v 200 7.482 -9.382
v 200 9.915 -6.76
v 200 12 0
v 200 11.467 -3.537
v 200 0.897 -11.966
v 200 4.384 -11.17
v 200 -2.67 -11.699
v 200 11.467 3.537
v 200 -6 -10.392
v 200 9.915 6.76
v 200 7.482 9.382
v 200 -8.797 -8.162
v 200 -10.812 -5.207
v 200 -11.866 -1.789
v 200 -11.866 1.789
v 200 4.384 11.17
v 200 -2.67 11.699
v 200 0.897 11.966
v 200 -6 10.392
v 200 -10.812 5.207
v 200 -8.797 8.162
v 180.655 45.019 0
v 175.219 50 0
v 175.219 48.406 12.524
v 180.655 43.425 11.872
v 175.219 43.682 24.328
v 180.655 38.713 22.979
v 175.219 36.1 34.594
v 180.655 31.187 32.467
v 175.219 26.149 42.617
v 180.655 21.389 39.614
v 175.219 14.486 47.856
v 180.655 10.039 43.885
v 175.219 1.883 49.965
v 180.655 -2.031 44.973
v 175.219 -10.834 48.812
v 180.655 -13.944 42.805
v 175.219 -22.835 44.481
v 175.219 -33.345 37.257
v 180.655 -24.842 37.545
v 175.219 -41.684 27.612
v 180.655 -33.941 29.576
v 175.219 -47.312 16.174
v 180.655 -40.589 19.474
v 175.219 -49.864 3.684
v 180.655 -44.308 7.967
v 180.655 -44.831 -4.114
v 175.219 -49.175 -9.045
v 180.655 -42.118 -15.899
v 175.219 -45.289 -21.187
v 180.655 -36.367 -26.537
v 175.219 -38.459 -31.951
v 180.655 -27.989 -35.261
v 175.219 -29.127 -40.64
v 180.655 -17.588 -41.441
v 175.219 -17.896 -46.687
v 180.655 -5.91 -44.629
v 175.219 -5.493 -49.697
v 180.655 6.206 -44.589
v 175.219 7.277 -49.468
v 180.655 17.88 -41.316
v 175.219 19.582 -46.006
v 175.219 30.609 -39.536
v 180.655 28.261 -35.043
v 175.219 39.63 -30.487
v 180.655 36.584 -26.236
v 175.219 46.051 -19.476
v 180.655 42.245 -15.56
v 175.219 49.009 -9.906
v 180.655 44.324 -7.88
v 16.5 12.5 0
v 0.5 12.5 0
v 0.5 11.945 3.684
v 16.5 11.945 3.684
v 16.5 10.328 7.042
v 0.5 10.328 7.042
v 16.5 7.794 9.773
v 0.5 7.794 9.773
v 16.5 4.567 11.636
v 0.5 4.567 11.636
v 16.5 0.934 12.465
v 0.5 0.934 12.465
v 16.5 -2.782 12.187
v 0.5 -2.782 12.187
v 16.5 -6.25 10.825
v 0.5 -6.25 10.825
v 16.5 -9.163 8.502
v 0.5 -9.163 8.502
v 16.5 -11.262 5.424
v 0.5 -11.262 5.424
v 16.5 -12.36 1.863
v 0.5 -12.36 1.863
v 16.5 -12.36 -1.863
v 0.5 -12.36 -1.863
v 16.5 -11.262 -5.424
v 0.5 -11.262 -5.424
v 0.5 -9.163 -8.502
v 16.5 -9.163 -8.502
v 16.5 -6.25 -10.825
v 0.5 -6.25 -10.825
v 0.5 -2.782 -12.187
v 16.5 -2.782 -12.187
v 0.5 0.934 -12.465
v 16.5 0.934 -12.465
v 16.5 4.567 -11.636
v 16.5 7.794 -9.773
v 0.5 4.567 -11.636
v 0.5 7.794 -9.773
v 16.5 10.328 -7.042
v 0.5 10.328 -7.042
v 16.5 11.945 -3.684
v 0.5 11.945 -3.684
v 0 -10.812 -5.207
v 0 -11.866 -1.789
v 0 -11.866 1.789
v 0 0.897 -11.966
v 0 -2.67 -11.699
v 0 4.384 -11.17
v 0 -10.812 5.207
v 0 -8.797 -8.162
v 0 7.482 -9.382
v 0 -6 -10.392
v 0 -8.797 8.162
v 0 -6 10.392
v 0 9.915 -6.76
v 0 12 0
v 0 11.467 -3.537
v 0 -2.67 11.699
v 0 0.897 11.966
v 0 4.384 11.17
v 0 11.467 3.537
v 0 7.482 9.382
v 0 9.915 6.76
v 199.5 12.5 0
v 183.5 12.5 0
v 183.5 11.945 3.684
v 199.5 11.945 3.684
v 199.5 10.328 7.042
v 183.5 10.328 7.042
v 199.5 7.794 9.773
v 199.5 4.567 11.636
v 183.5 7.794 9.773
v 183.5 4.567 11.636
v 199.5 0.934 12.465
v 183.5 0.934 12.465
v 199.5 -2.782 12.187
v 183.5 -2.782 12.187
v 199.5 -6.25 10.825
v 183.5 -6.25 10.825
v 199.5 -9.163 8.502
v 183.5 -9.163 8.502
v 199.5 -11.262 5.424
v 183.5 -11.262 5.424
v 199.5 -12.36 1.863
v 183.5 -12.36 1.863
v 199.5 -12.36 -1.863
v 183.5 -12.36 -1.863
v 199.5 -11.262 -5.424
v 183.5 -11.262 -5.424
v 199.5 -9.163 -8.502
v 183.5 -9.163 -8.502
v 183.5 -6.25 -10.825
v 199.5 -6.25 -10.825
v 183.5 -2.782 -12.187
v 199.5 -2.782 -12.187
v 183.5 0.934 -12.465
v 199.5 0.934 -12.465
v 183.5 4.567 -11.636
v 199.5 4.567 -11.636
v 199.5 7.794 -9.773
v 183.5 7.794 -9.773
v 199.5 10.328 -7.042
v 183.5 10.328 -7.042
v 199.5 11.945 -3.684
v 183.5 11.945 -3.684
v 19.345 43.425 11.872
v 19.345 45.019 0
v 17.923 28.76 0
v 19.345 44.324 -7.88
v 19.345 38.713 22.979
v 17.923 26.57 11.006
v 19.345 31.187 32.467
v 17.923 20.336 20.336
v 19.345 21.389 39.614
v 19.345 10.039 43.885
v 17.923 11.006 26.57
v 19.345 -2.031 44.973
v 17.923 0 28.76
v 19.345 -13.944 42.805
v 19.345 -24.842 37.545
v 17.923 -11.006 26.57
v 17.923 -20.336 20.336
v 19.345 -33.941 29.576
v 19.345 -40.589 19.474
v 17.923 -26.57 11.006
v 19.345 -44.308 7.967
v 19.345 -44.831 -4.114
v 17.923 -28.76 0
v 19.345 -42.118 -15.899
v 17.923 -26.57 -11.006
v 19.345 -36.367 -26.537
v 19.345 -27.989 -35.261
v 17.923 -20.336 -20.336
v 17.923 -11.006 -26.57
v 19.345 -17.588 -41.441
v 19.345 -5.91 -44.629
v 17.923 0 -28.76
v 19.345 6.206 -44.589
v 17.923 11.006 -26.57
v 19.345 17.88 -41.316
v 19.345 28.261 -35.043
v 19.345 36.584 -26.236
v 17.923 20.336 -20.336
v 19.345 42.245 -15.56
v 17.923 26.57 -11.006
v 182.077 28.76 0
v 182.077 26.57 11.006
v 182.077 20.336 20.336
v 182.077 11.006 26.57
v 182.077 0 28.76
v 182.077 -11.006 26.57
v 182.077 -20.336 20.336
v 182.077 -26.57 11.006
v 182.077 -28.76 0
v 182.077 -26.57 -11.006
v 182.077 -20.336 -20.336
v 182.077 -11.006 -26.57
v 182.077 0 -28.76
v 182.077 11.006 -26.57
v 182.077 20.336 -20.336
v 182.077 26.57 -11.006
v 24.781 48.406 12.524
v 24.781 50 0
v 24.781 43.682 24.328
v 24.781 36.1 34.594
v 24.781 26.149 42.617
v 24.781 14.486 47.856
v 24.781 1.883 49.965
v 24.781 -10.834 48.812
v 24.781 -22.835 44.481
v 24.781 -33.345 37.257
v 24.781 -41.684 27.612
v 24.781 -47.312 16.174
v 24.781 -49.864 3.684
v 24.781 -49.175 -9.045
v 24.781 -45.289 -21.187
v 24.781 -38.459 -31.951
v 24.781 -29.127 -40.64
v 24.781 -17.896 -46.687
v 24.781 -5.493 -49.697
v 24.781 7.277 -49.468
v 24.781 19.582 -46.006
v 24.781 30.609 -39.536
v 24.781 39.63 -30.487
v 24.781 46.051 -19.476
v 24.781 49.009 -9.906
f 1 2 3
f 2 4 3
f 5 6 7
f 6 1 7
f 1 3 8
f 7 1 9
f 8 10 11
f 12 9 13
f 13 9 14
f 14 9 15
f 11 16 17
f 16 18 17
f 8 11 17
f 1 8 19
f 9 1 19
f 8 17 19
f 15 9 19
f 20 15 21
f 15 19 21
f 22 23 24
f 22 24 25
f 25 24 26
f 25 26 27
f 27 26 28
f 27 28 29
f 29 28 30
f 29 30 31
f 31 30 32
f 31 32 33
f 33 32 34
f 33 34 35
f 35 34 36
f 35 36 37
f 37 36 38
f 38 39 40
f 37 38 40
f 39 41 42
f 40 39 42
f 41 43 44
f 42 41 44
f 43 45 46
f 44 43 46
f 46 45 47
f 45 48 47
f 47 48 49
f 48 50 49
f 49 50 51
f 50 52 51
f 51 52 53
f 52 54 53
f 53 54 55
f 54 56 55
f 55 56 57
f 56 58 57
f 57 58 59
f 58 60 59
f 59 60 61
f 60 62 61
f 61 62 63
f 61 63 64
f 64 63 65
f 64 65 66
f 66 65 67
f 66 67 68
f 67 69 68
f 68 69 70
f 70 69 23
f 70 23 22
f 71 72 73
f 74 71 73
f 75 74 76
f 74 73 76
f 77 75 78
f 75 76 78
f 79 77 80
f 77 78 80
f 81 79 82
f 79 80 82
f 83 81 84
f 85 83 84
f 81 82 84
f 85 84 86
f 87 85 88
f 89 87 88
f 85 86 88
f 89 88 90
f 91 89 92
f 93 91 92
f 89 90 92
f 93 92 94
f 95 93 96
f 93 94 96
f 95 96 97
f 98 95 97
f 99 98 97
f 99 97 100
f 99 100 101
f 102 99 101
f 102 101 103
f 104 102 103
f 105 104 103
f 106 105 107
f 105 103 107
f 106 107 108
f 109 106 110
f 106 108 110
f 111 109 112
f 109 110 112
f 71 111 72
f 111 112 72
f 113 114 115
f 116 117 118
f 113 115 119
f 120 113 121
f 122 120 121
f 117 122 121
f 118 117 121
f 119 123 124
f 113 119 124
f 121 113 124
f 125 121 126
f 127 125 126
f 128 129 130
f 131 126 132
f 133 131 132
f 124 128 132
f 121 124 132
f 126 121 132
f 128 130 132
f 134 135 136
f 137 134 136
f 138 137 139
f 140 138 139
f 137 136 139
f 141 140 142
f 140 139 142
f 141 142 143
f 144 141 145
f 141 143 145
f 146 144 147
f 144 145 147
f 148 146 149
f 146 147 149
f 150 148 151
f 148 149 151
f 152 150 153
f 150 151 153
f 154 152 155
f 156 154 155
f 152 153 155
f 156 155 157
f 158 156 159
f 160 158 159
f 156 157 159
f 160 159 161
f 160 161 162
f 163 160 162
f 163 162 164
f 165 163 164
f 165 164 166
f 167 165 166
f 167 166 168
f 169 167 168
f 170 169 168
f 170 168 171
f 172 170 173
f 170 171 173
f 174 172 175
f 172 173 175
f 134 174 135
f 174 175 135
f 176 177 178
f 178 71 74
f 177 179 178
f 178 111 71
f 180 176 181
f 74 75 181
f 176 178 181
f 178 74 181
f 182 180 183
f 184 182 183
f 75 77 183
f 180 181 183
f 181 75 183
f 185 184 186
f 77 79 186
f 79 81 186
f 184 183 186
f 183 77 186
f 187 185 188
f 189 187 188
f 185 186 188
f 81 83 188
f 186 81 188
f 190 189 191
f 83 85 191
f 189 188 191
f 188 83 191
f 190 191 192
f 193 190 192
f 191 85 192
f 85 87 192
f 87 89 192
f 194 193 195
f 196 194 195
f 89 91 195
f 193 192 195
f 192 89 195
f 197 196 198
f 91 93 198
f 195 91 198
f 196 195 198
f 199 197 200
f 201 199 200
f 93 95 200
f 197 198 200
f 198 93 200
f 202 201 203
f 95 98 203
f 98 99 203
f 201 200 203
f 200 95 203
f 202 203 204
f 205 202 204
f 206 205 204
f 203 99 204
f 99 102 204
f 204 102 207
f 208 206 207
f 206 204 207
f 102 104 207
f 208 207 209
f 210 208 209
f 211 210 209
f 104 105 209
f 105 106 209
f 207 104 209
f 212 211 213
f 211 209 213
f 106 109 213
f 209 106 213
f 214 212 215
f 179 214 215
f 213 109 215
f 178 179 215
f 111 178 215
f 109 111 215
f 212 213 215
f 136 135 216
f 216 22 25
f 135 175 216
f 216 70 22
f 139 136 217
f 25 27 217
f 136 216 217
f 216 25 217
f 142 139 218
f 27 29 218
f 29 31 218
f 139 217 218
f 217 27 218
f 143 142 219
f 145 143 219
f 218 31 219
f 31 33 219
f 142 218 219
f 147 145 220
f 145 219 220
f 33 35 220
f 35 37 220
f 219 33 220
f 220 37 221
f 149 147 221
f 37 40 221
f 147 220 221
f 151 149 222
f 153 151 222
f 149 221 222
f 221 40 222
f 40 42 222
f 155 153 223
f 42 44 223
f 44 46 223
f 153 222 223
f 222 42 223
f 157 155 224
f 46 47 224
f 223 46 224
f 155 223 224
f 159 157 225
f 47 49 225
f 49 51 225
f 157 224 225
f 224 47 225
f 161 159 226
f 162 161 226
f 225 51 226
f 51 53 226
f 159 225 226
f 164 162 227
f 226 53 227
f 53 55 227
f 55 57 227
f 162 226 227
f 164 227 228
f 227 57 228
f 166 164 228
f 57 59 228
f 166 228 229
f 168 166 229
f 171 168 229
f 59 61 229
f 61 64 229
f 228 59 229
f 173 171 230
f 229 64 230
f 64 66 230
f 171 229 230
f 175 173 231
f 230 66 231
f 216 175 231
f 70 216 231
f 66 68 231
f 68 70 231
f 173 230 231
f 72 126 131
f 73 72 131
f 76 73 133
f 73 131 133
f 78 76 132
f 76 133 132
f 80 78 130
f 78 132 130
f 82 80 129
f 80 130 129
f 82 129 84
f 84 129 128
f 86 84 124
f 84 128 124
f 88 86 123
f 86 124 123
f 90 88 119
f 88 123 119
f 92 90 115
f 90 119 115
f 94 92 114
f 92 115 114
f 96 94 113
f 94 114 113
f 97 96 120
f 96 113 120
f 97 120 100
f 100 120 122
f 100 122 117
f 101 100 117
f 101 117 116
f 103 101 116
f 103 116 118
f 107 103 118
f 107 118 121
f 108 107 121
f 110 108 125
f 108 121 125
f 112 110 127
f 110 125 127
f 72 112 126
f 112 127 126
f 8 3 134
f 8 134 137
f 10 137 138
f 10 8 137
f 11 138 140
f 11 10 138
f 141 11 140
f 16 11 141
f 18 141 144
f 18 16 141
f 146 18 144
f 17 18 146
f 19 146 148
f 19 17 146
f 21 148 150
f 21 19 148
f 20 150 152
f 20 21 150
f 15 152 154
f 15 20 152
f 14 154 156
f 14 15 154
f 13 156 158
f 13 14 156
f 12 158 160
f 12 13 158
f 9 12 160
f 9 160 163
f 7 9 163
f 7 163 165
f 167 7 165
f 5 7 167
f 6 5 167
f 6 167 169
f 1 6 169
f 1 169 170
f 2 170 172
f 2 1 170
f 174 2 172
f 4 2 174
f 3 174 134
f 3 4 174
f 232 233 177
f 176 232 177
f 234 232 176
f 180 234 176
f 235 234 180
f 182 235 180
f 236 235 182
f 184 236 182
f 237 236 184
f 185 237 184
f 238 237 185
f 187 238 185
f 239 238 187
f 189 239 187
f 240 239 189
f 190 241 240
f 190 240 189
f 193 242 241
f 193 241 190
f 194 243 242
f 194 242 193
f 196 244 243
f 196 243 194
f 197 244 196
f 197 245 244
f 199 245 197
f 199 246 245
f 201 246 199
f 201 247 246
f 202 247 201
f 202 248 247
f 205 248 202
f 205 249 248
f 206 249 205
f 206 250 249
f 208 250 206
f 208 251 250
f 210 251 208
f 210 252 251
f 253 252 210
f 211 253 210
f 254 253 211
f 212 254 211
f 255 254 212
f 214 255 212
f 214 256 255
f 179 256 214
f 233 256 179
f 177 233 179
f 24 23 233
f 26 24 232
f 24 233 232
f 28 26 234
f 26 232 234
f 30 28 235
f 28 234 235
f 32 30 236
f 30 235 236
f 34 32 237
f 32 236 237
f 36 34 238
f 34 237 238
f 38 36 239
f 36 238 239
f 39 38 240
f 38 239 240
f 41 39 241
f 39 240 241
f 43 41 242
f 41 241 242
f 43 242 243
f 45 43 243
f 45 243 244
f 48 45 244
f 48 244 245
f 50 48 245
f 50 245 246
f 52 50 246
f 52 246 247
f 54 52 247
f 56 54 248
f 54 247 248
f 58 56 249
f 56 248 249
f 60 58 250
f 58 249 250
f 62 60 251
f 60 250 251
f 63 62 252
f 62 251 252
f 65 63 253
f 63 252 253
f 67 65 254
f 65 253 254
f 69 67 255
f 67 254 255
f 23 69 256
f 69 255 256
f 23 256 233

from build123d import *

# Parameters (mm, degrees)
F2_SIZE  = 5
F3_SIZE  = 5
F4_SIZE2 = 0.5
F4_SIZE  = 0.5


with BuildPart() as f1:
    # F0 (on Top) → F1 (revolve)
    with BuildSketch(Plane.XY):
        Polygon((0, 12.5), (0, 0), (200, 0), (200, 12.5), (183.5, 12.5), (180.219175, 50), (19.780825, 50), (16.5, 12.5), align=None)
    revolve(axis=Axis((100, 0, 0), (1, 0, 0)))

    # F2
    f2_edges = [f1.edges().sort_by_distance(p)[0] for p in [
        (19.780825, -50, 0),
    ]]
    chamfer(f2_edges, length=F2_SIZE)

    # F3
    f3_edges = [f1.edges().sort_by_distance(p)[0] for p in [
        (180.219175, -50, 0),
    ]]
    chamfer(f3_edges, length=F3_SIZE)

    # F4
    f4_edges = [f1.edges().sort_by_distance(p)[0] for p in [
        (0, -12.5, 0),
        (200, -12.5, 0),
    ]]
    chamfer(f4_edges, length=F4_SIZE, length2=F4_SIZE2)


solid = f1.part
